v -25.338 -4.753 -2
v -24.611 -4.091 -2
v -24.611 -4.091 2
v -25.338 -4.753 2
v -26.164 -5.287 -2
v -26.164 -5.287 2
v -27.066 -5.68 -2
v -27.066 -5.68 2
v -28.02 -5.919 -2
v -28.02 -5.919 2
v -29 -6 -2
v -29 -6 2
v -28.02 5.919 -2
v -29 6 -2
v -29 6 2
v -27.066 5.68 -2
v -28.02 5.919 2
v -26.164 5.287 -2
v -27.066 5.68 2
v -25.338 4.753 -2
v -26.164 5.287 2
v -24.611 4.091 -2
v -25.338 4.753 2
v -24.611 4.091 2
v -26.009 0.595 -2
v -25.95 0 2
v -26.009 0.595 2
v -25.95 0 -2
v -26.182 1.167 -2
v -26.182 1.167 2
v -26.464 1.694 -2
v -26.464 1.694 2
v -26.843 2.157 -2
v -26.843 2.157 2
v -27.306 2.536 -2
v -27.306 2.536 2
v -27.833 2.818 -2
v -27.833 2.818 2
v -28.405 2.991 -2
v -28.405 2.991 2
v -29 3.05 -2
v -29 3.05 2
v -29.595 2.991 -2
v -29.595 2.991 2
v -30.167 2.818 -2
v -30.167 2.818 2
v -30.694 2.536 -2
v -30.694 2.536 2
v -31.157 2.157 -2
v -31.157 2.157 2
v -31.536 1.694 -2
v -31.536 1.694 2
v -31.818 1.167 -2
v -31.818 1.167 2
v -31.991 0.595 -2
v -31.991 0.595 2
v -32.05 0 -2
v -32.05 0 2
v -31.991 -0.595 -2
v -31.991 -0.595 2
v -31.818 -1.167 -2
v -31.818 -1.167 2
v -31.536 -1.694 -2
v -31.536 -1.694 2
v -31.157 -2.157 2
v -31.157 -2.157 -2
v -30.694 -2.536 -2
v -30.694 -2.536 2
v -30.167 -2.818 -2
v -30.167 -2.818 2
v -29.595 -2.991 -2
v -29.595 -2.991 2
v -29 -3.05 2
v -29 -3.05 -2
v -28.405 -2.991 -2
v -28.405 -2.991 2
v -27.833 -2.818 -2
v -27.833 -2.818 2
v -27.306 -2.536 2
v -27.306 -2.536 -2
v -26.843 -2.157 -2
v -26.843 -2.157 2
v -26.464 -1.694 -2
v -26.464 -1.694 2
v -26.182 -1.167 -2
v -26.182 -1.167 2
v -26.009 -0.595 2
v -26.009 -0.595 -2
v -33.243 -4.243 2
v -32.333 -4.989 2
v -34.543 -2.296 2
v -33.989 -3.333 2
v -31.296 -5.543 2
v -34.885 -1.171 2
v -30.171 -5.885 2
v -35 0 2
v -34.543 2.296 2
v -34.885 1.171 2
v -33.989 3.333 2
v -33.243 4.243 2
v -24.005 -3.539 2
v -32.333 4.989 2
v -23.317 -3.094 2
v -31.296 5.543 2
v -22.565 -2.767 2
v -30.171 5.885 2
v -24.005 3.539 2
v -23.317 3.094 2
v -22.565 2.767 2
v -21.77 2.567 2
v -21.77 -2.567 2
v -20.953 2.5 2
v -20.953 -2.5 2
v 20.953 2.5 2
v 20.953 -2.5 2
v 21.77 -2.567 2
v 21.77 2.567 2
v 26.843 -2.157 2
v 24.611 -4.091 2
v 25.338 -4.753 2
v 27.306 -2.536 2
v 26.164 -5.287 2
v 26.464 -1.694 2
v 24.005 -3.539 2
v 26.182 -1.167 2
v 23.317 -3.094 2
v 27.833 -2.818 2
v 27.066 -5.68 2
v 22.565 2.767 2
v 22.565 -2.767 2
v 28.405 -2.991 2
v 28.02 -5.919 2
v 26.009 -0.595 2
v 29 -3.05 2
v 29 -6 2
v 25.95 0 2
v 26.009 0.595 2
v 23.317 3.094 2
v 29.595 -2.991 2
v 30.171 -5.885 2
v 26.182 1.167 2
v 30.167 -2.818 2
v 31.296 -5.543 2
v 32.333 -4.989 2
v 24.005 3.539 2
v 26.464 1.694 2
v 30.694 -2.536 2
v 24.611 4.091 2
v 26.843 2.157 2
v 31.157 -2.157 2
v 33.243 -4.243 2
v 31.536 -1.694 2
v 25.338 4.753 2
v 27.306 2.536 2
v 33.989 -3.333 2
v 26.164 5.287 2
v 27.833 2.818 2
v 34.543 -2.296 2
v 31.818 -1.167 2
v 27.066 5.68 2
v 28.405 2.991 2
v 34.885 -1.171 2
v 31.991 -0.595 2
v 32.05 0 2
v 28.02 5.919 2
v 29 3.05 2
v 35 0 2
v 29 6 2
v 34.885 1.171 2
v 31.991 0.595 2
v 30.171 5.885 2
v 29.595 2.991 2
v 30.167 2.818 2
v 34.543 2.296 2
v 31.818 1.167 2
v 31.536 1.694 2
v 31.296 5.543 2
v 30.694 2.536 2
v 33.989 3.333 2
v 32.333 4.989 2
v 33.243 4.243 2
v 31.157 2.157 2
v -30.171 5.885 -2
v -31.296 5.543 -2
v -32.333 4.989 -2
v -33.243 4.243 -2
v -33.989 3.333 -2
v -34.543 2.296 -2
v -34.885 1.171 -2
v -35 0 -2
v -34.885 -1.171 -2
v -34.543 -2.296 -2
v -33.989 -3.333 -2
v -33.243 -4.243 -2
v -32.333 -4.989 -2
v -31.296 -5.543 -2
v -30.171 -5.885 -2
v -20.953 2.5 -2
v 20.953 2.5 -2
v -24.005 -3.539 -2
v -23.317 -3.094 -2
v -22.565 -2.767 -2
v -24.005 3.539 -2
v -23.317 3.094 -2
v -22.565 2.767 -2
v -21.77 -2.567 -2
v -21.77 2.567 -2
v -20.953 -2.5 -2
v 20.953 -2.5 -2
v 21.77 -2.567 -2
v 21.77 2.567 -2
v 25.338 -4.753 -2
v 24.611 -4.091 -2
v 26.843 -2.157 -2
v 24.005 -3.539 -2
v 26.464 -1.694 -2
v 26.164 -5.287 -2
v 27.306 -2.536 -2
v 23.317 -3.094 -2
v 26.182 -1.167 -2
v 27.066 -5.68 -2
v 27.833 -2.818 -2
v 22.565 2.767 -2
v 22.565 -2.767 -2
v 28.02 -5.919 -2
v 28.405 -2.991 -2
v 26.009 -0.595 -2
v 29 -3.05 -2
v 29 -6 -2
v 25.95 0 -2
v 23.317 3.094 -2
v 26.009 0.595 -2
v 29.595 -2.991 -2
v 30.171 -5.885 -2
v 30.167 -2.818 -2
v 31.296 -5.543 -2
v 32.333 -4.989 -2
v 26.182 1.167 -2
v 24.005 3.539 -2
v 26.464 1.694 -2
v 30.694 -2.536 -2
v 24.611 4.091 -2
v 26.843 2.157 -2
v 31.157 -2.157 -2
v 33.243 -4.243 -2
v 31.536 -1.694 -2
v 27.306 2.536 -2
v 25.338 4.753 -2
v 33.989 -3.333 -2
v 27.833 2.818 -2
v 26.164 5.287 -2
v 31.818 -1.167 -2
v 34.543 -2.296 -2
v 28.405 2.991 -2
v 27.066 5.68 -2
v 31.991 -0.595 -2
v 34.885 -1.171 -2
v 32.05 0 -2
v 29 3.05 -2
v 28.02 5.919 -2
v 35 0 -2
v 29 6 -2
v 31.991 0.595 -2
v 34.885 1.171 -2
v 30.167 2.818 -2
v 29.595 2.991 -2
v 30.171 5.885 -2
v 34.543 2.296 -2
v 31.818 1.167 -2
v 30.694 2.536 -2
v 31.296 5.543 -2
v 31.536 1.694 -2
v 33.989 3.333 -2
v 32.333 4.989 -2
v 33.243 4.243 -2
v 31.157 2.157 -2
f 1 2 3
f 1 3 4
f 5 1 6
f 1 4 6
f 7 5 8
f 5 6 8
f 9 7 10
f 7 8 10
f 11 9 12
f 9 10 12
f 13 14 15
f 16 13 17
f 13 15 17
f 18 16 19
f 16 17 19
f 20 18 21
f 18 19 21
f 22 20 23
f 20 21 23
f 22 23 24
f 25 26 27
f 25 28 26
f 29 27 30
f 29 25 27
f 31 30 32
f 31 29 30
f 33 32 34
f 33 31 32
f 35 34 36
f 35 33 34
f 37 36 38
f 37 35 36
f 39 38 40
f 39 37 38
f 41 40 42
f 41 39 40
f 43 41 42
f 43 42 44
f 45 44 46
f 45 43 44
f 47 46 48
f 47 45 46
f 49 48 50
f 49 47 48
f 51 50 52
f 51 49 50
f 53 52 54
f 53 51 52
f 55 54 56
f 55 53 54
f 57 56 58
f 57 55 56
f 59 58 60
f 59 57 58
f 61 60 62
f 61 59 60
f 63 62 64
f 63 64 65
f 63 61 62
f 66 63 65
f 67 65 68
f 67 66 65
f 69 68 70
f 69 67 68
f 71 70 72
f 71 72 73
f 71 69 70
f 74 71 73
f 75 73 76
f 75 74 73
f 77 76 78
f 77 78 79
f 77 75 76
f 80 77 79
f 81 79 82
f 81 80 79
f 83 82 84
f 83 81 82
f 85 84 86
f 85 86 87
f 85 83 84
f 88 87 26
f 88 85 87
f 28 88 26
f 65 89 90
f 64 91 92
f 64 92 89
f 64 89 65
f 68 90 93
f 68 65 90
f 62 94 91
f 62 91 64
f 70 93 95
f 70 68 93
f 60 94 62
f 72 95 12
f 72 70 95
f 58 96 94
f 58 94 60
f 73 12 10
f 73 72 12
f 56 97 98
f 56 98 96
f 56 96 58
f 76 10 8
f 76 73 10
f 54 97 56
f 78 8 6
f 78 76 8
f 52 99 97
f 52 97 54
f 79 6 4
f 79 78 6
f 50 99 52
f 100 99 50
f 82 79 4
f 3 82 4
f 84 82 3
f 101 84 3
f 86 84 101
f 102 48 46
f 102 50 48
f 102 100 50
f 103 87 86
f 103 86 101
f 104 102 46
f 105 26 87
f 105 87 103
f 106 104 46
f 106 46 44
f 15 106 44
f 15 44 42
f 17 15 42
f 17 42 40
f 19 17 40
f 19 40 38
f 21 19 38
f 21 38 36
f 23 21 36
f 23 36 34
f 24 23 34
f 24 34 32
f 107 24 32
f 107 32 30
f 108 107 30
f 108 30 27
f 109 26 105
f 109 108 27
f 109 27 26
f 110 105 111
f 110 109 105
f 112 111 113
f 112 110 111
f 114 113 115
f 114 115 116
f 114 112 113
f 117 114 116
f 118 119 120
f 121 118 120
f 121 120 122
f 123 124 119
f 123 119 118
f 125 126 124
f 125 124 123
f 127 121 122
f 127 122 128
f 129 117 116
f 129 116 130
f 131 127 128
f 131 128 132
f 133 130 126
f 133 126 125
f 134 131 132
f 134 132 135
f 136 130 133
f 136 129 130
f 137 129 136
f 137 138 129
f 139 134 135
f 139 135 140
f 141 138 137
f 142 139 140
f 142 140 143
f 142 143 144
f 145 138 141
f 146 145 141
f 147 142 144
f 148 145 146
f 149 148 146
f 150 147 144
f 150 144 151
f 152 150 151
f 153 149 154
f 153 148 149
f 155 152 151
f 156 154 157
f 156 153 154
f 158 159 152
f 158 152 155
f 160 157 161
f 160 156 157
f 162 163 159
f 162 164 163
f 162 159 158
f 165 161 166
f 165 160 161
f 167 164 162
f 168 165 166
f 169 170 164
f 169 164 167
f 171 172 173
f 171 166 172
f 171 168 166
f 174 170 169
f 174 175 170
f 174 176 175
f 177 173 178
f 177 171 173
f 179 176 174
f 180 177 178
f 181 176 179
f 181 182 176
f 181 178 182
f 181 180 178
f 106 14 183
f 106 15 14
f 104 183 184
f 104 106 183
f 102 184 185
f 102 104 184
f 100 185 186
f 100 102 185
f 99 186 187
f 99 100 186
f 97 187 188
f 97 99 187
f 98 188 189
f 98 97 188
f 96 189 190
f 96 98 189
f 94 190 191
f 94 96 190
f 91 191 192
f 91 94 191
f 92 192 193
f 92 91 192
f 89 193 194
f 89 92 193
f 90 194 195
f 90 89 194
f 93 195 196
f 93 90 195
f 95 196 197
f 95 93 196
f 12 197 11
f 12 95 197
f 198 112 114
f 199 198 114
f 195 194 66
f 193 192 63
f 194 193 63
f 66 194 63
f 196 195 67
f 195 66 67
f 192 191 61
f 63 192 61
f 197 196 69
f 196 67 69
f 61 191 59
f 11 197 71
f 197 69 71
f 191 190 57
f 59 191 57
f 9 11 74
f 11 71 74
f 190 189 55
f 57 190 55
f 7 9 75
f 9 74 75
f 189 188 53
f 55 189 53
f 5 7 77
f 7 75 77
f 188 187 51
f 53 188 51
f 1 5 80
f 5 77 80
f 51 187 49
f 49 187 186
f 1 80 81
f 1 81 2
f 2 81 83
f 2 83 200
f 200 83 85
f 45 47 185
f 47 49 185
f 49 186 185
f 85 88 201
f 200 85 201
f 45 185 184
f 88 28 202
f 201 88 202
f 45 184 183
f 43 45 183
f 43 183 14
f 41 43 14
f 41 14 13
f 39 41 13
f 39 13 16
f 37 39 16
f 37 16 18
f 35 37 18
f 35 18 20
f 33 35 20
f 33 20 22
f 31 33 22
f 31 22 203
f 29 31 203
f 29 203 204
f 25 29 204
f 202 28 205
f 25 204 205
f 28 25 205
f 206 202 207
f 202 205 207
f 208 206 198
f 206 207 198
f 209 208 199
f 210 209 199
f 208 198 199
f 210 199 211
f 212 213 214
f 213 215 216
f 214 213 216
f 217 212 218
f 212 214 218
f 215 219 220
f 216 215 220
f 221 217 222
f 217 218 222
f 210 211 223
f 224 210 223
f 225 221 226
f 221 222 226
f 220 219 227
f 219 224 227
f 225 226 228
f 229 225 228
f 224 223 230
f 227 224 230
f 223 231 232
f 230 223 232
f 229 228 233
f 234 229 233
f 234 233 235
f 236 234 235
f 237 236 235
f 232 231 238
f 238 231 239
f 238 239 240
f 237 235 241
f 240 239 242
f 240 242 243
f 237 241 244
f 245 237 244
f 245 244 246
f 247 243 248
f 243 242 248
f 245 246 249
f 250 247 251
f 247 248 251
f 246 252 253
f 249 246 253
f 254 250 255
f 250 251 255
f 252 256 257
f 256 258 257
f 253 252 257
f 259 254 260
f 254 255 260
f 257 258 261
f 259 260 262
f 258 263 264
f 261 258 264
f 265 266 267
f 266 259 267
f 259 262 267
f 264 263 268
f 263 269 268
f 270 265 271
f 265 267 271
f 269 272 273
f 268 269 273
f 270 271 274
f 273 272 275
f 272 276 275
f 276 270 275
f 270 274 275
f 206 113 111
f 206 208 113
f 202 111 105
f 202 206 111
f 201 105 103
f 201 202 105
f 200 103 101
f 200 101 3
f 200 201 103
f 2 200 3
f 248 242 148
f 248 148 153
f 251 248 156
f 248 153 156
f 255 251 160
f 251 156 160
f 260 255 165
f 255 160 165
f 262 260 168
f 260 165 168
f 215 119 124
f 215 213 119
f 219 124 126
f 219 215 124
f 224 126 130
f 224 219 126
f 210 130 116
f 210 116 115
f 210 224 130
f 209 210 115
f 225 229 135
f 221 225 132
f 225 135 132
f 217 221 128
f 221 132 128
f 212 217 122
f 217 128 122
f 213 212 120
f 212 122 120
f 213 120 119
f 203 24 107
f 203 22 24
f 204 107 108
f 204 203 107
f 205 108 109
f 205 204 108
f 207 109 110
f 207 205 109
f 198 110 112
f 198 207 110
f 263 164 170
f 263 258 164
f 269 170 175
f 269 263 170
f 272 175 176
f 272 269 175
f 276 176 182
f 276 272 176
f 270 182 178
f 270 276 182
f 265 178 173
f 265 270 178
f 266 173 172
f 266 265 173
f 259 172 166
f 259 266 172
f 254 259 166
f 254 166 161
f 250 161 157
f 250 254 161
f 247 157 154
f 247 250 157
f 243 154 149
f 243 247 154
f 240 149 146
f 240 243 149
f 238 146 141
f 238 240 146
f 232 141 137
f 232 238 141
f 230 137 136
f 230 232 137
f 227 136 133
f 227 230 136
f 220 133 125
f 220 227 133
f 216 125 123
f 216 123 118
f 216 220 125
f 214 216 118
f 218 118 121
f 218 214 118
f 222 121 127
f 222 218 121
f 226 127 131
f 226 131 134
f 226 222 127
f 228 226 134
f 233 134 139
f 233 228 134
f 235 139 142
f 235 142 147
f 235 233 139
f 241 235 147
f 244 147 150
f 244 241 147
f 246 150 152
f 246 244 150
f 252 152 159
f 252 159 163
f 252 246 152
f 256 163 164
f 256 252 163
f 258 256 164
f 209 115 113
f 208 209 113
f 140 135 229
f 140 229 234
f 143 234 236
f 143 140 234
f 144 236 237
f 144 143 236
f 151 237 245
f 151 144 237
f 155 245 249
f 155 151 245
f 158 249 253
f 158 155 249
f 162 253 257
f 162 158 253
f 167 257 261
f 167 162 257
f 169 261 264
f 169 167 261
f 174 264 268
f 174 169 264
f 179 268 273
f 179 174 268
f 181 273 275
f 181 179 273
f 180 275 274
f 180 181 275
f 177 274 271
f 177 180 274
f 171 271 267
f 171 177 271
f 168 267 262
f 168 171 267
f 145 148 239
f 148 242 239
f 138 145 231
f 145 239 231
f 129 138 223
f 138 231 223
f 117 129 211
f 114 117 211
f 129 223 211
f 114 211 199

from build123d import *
from build123d.topology import SkipClean

# Parameters (mm, degrees)
SKETCH_1_R          = 3.05
EXTRUDE_1_DEPTH     = 2
CUT_EXTRUDE_1_DEPTH = 4.2
FILLET_1_R          = 5


with BuildPart() as part:
    # 草图1 → 凸台-拉伸1 (new, symmetric)
    with BuildSketch(Plane.XY):
        with BuildLine():
            Line((-29, -6), (29, -6))
            ThreePointArc((29, -6), (35, 0), (29, 6))
            Line((29, 6), (-29, 6))
            ThreePointArc((-29, 6), (-35, 0), (-29, -6))
        make_face()
        with Locations((-29, 0)):
            Circle(SKETCH_1_R, mode=Mode.SUBTRACT)
        with Locations((29, 0)):
            Circle(SKETCH_1_R, mode=Mode.SUBTRACT)
    extrude(amount=EXTRUDE_1_DEPTH, both=True)

    # 草图2 → 切除-拉伸1 (cut)
    with SkipClean():  # the faces are left unmerged after this step: merging them gives an invalid solid
        with BuildSketch(Plane.XY.offset(2)):
            with BuildLine():
                Line((23.545643943, -2.5), (-23.545643943, -2.5))
                ThreePointArc((-23.545643943, -2.5), (-25.759629651, -5.049752469), (-29, -6))
                Line((-29, -6), (29, -6))
                ThreePointArc((29, -6), (25.759629651, -5.049752469), (23.545643943, -2.5))
            make_face()
            with BuildLine():
                ThreePointArc((-29, 6), (-25.759629651, 5.049752469), (-23.545643943, 2.5))
                Line((-23.545643943, 2.5), (23.545643943, 2.5))
                ThreePointArc((23.545643943, 2.5), (25.759629651, 5.049752469), (29, 6))
                Line((29, 6), (-29, 6))
            make_face()
        extrude(amount=-CUT_EXTRUDE_1_DEPTH, mode=Mode.SUBTRACT)

    # 圆角1
    fillet_1_edges = [part.edges().sort_by_distance(p)[0] for p in [
        (-23.545643943, -2.5, 0),
        (23.545643943, -2.5, 0),
        (-23.545643943, 2.5, 0),
        (23.545643943, 2.5, 0),
    ]]
    fillet(fillet_1_edges, radius=FILLET_1_R)


solid = part.part
